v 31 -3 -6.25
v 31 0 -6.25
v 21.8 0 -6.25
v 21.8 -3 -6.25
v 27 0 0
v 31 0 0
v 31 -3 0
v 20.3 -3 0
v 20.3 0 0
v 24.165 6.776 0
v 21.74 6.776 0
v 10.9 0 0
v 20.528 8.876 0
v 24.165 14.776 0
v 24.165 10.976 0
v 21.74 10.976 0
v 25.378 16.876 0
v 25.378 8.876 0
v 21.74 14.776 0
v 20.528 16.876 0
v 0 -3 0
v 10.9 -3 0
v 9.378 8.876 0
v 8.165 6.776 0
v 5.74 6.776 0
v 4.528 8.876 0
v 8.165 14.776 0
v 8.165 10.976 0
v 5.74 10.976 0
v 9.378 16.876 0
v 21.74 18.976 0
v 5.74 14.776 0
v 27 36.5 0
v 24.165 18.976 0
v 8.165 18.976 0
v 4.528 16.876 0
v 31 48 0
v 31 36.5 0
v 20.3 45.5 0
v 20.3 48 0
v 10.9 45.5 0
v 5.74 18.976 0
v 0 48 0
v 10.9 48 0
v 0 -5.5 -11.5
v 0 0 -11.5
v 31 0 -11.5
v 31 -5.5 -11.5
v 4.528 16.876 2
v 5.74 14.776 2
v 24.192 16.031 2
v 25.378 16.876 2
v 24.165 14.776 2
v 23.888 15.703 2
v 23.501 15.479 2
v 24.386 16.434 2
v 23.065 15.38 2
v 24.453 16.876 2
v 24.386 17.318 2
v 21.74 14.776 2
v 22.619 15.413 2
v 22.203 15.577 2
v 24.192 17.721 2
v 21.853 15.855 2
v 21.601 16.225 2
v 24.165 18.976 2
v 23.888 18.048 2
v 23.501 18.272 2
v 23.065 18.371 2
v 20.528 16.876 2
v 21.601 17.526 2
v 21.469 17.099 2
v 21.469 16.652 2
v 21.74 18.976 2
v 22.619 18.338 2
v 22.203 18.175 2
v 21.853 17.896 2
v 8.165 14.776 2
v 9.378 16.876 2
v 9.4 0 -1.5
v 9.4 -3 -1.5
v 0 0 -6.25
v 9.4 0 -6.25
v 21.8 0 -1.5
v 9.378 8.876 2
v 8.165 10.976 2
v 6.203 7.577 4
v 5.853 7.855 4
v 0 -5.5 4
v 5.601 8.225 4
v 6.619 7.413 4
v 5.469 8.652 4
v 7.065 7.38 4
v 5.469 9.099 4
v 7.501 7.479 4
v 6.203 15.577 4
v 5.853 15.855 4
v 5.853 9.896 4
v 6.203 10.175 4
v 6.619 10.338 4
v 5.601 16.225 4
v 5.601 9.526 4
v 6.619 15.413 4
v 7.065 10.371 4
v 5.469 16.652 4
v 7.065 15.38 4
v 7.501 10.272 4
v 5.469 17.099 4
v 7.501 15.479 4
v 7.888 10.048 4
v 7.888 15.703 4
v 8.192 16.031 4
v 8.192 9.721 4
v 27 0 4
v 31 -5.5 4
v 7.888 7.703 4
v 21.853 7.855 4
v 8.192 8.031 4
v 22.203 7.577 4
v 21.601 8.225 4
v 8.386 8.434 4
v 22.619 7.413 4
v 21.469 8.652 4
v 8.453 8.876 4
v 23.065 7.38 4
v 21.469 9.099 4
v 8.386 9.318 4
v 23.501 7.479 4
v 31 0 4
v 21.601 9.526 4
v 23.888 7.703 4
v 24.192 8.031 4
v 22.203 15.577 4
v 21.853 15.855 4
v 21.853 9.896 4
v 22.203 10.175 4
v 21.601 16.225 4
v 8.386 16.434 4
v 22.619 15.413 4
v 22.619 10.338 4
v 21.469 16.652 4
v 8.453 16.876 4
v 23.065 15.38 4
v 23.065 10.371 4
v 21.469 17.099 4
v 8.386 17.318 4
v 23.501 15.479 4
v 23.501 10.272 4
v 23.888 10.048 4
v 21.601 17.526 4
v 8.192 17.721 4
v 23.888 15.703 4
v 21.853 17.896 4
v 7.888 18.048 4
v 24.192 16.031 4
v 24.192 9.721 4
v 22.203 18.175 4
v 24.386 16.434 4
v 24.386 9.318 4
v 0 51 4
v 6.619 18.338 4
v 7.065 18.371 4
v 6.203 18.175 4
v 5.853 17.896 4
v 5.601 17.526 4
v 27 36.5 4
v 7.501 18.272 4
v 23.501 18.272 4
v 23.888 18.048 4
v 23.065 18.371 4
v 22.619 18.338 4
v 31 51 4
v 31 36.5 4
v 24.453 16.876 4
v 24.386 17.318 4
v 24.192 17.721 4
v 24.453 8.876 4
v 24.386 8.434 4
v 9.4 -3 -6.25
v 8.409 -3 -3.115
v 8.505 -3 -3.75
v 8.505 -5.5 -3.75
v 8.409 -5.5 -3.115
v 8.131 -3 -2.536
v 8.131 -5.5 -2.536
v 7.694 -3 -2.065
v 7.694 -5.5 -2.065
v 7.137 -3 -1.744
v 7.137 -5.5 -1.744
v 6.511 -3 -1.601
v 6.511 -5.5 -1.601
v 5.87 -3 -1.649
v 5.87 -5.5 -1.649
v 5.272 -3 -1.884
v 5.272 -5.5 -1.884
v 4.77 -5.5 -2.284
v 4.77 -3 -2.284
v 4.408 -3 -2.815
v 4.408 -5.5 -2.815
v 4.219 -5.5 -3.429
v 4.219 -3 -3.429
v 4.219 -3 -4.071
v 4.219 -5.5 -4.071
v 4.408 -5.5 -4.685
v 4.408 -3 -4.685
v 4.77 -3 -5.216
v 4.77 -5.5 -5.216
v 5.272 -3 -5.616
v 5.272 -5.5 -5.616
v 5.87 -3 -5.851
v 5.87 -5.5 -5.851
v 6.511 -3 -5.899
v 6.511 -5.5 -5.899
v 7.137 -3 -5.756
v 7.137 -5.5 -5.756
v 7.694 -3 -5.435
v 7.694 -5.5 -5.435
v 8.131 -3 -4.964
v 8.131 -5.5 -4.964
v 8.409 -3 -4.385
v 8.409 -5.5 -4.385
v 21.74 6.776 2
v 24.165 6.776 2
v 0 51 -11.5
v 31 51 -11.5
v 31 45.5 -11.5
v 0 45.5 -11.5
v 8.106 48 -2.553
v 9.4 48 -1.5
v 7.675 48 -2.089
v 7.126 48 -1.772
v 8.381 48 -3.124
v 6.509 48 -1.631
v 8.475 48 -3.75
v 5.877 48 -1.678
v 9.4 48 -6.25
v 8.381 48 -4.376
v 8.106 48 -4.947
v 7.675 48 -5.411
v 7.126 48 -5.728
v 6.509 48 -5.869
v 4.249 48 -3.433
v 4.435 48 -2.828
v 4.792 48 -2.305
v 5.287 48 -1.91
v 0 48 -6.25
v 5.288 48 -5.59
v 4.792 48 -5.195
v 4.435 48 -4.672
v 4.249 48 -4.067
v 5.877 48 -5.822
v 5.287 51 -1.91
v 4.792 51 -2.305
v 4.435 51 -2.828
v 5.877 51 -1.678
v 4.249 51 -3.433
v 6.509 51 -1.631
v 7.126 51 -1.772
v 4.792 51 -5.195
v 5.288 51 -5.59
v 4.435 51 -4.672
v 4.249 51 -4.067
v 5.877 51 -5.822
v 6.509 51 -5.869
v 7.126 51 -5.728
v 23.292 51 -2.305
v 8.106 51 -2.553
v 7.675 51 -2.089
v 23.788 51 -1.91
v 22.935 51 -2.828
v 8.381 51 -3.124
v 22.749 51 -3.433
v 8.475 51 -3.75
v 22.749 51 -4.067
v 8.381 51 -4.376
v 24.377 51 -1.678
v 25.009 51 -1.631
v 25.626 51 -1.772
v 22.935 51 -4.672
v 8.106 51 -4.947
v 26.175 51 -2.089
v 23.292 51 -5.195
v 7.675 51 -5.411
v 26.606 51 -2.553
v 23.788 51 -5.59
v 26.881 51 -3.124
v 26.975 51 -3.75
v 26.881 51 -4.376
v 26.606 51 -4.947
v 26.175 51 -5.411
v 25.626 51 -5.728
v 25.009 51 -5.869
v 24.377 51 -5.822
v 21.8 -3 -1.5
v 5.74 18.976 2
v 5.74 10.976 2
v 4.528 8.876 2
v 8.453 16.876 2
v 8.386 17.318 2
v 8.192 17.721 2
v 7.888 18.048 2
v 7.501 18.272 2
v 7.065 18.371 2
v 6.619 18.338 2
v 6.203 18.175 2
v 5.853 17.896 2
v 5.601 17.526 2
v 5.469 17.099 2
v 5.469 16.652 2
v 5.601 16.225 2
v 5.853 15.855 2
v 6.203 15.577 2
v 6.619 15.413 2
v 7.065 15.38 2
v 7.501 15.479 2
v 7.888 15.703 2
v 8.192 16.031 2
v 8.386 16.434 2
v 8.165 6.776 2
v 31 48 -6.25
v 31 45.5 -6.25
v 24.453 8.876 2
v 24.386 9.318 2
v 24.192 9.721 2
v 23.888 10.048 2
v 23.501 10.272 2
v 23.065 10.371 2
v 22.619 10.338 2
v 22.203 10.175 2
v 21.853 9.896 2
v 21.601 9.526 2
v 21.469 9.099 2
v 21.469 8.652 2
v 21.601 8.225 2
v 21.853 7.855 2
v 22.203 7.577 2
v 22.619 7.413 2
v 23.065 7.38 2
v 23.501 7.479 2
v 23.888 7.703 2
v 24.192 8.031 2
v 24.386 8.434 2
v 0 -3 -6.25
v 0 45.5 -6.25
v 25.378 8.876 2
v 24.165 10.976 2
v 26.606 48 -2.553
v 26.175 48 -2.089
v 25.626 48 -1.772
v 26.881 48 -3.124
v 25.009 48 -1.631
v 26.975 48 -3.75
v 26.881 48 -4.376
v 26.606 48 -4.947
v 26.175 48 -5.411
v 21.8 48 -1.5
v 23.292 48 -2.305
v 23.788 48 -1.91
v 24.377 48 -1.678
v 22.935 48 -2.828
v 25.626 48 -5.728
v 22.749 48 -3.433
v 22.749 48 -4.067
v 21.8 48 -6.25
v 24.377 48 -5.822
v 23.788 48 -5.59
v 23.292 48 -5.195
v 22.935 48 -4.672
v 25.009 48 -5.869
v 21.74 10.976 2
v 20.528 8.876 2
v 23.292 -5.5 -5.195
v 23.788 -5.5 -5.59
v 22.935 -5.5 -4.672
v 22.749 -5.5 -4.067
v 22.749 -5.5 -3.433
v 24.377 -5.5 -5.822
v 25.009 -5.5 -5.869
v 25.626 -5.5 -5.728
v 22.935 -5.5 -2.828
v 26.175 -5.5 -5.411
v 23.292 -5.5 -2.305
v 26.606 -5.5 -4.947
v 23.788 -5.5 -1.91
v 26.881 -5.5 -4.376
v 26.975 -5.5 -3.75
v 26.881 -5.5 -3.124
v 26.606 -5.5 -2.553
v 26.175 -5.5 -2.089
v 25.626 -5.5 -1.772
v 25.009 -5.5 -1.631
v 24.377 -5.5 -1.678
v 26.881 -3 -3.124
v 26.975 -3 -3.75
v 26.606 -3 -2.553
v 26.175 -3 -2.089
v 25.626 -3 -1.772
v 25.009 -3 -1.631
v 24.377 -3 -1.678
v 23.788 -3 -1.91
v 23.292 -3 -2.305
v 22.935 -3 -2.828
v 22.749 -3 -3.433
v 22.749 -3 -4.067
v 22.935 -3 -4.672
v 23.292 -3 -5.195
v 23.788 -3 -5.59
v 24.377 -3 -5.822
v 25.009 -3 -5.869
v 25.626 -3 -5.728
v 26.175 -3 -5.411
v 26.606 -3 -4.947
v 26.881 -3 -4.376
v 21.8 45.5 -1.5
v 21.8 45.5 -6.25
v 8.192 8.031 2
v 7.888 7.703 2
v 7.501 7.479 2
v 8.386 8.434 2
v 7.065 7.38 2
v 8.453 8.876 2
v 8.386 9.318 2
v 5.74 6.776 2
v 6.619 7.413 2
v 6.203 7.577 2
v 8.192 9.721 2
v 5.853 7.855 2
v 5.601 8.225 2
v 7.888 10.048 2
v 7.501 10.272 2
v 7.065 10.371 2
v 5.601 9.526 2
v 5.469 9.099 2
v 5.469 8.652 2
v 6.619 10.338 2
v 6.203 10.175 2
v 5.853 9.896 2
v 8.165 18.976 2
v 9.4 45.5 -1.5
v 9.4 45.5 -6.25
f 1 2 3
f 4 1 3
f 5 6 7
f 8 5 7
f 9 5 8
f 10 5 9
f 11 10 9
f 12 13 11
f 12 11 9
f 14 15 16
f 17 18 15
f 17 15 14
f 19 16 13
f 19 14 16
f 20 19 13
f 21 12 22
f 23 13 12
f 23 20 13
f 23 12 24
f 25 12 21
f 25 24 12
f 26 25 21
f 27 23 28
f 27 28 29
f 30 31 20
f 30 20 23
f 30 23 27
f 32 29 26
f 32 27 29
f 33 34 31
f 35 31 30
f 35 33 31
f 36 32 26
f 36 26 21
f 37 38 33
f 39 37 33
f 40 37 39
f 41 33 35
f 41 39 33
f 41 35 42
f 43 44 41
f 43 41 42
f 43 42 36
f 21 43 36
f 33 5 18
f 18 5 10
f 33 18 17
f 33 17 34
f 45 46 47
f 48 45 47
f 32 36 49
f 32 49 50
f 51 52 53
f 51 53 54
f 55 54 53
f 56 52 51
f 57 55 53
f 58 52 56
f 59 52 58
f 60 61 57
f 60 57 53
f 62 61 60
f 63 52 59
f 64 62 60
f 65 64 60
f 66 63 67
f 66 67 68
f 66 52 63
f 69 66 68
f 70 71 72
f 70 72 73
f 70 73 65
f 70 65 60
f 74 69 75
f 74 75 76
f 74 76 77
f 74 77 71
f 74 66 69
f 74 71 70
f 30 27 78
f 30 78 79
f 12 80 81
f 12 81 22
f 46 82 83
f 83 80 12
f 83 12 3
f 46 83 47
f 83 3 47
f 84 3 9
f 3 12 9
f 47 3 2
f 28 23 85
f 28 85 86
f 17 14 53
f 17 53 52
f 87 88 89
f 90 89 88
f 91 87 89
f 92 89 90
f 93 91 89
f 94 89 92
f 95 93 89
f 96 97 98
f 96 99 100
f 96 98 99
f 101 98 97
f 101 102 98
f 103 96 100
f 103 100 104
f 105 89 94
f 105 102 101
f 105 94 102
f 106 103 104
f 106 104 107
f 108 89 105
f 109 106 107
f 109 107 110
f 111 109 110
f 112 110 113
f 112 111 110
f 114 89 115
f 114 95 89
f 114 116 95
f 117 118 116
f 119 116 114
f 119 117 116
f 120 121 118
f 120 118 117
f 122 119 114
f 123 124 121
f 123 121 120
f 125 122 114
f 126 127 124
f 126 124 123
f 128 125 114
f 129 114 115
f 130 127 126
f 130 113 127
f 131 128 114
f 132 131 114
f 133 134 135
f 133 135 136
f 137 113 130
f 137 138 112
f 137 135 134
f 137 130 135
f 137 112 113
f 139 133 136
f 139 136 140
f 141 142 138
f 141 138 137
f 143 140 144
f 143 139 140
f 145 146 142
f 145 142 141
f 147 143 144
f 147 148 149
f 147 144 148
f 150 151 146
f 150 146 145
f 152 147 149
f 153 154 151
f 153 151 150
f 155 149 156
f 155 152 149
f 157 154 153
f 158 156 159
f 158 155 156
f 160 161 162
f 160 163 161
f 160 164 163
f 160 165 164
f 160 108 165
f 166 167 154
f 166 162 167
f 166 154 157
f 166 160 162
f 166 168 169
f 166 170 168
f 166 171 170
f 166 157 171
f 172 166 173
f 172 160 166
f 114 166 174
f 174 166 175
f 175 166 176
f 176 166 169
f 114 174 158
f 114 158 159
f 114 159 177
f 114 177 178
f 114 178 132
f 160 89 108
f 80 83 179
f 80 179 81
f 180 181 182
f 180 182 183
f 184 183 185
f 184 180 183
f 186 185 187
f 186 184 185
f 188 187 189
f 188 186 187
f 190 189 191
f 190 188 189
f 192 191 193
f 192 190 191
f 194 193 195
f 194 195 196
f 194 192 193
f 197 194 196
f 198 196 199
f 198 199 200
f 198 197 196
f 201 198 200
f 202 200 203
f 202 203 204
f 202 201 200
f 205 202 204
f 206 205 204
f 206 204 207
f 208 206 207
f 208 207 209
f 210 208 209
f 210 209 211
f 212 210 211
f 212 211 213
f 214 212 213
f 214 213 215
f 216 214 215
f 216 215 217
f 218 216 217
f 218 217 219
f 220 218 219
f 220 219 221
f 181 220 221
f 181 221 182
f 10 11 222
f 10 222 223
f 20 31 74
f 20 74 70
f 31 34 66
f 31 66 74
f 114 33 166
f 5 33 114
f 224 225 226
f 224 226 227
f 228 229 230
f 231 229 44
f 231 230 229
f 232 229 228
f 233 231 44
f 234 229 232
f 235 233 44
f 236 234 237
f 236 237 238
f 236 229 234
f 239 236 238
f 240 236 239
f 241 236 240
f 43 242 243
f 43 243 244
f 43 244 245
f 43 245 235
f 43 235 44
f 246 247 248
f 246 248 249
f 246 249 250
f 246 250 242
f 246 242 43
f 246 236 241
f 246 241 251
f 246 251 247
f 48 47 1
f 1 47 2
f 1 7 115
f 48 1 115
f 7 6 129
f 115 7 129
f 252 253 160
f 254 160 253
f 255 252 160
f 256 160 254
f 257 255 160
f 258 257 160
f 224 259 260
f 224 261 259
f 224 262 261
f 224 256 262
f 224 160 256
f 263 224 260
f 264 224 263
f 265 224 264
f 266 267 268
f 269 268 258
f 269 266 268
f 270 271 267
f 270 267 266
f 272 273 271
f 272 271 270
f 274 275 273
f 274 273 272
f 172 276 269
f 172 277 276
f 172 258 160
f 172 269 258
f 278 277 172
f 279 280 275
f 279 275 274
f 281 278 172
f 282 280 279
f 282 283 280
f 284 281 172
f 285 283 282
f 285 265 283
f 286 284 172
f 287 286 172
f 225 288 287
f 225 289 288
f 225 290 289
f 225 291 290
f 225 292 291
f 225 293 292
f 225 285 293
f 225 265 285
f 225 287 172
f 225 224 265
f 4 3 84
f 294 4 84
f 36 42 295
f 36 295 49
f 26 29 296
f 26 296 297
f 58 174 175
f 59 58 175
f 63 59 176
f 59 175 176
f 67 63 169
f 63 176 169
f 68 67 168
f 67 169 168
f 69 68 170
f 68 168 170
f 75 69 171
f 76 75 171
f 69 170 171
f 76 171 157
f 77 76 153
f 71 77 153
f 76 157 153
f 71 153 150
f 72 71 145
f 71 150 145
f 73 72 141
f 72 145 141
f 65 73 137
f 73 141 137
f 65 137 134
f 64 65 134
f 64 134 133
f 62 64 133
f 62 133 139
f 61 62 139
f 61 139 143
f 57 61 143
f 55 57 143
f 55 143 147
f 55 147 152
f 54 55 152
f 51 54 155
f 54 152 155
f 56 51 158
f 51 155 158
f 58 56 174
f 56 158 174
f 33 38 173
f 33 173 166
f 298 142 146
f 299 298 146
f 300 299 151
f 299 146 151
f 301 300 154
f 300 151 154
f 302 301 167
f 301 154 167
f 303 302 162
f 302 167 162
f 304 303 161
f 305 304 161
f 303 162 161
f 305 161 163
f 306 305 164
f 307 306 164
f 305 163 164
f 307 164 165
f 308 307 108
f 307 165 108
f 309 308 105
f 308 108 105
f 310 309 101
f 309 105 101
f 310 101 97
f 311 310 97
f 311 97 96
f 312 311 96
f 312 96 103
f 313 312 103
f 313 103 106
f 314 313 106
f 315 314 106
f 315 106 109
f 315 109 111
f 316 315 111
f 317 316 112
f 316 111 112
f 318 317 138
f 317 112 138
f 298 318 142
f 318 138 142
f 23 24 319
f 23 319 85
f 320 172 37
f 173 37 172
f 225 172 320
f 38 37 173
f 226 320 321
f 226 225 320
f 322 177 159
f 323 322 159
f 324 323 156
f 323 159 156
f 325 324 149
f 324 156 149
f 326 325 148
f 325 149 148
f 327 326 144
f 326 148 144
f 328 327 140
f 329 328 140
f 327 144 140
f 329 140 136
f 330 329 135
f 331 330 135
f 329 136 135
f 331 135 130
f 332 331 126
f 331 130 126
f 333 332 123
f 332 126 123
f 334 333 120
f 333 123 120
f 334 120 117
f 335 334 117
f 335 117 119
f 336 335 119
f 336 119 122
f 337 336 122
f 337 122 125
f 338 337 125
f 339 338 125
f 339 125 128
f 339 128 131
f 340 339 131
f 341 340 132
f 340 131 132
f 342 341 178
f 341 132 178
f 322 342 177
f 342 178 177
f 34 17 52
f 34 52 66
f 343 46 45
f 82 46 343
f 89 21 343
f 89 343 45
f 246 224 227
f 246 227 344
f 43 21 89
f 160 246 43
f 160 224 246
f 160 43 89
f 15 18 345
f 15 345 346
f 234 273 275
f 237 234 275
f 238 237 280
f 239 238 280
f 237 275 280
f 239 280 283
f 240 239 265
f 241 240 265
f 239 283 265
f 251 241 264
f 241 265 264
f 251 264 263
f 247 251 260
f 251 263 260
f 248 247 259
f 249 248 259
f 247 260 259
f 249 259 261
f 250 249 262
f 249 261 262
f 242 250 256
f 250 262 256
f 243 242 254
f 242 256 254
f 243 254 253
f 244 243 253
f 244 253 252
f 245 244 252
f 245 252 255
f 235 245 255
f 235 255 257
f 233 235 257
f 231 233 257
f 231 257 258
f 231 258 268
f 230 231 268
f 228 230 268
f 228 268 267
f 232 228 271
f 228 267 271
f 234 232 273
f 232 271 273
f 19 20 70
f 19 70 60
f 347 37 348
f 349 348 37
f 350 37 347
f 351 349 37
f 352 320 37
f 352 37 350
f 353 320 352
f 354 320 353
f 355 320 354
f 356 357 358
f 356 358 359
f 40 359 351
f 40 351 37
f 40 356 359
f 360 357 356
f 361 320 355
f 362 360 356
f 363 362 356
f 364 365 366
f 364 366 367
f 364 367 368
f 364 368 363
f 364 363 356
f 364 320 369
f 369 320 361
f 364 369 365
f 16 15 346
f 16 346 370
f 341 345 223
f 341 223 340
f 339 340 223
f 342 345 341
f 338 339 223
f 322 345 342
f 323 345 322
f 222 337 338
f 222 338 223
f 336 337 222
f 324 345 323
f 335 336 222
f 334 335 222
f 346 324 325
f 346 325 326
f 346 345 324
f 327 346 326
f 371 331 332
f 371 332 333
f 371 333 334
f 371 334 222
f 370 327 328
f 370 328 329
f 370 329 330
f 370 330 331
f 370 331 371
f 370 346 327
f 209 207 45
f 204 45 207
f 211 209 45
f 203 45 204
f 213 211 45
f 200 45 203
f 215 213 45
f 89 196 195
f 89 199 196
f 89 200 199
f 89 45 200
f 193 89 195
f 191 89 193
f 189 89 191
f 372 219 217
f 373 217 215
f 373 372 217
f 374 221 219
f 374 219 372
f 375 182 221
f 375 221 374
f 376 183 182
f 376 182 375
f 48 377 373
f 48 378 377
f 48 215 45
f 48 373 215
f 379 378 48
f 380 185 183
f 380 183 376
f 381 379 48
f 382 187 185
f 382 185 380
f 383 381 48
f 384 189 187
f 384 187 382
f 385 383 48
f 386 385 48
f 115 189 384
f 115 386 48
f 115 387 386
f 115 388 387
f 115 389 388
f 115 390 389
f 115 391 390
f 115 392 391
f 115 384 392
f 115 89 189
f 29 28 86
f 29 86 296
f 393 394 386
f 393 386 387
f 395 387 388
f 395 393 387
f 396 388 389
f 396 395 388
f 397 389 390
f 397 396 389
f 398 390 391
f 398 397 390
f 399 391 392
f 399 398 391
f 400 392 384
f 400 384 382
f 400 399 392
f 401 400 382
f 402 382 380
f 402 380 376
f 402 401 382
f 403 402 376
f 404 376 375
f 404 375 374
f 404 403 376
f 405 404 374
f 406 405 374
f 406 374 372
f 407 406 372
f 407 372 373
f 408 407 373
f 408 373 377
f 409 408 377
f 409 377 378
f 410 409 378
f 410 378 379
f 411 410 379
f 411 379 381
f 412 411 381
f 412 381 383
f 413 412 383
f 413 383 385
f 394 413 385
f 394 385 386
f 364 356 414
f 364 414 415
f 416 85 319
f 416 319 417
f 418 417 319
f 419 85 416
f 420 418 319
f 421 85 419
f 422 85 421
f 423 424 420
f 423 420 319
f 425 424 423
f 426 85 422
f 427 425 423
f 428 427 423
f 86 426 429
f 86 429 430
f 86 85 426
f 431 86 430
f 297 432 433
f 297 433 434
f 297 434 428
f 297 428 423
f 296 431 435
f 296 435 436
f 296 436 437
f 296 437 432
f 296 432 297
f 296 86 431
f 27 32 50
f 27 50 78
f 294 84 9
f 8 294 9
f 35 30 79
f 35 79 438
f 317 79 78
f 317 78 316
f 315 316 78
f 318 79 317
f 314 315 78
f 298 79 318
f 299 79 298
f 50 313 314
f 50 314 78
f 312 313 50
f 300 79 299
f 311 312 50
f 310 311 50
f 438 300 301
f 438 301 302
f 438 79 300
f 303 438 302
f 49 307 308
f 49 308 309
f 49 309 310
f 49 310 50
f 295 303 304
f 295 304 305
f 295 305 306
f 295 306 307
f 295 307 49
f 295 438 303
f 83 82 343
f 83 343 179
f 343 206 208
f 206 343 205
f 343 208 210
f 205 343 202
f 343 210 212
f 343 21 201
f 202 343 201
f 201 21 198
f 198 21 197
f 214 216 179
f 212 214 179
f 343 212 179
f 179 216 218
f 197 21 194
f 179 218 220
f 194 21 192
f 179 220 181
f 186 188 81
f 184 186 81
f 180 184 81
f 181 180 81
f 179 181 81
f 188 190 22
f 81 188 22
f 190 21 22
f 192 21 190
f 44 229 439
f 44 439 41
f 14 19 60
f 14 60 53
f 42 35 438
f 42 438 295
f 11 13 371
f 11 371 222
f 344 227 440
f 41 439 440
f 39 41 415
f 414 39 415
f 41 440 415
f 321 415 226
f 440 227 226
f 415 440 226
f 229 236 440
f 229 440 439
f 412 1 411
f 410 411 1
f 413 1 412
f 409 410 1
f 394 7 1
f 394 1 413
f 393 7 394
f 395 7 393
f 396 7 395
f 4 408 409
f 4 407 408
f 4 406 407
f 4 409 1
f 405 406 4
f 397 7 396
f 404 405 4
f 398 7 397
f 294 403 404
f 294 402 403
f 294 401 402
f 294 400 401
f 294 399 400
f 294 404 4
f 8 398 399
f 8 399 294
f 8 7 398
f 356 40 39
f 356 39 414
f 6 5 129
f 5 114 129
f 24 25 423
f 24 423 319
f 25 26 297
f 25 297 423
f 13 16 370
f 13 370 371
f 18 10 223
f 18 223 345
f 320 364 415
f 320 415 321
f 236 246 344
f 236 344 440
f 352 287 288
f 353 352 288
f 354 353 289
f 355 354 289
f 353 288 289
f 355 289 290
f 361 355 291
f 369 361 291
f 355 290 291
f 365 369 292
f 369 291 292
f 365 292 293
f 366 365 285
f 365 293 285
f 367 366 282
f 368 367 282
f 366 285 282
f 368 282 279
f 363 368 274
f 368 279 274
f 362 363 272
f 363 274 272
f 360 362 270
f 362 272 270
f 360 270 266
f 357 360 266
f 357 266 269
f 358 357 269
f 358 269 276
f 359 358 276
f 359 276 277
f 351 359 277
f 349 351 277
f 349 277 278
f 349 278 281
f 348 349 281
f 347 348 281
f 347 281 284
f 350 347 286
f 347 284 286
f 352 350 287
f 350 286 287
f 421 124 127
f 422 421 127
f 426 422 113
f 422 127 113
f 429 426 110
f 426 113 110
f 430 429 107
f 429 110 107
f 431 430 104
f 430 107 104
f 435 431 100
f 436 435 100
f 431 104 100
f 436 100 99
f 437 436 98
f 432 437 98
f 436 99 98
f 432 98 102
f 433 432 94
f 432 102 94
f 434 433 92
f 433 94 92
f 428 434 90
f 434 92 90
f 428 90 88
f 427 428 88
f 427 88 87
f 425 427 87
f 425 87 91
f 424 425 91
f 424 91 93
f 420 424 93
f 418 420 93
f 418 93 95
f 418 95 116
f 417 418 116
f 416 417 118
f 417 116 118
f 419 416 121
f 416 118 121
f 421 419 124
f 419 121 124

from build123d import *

# Parameters (mm, degrees)
BOSS_EXTRUDE1_DEPTH = 4
SKETCH2_R           = 1.5
BOSS_EXTRUDE2_DEPTH = 2
BOSS_EXTRUDE3_DEPTH = 5.5
SKETCH4_R           = 2.125
BOSS_EXTRUDE4_DEPTH = 3
SKETCH6_W           = 31
SKETCH6_H           = 15.5
SKETCH6_R           = 2.155122413
SKETCH6_R_2         = 2.125
BOSS_EXTRUDE5_DEPTH = 5.5
CUT_EXTRUDE4_DEPTH  = 3


with BuildPart() as part:
    # Sketch1 → Boss-Extrude1 (new body)
    with BuildSketch(Plane.XY):
        Polygon((0, 51), (31, 51), (31, 36.5), (27, 36.5), (27, 0), (0, 0), align=None)
        Polygon((24.165093822, 18.975641236), (21.740222692, 18.975641236), (20.527787127, 16.875641236), (21.740222692, 14.775641236), (24.165093822, 14.775641236), (25.377529388, 16.875641236), align=None, mode=Mode.SUBTRACT)
        Polygon((24.165093822, 10.975641236), (21.740222692, 10.975641236), (20.527787127, 8.875641236), (21.740222692, 6.775641236), (24.165093822, 6.775641236), (25.377529388, 8.875641236), align=None, mode=Mode.SUBTRACT)
        Polygon((8.165093822, 18.975641236), (5.740222692, 18.975641236), (4.527787127, 16.875641236), (5.740222692, 14.775641236), (8.165093822, 14.775641236), (9.377529388, 16.875641236), align=None, mode=Mode.SUBTRACT)
        Polygon((8.165093822, 10.975641236), (5.740222692, 10.975641236), (4.527787127, 8.875641236), (5.740222692, 6.775641236), (8.165093822, 6.775641236), (9.377529388, 8.875641236), align=None, mode=Mode.SUBTRACT)
    extrude(amount=BOSS_EXTRUDE1_DEPTH)

    # Sketch2 → Boss-Extrude2 (add)
    with BuildSketch(Plane.XY.offset(4)):
        Polygon((0, 51), (31, 51), (31, 36.5), (27, 36.5), (27, -2), (0, -2), align=None)
        with Locations((22.952658257, 16.875641236)):
            Circle(SKETCH2_R, mode=Mode.SUBTRACT)
        with Locations((22.952658257, 8.875641236)):
            Circle(SKETCH2_R, mode=Mode.SUBTRACT)
        with Locations((6.952658257, 8.875641236)):
            Circle(SKETCH2_R, mode=Mode.SUBTRACT)
        with Locations((6.952658257, 16.875641236)):
            Circle(SKETCH2_R, mode=Mode.SUBTRACT)
    extrude(amount=-BOSS_EXTRUDE2_DEPTH)

    # Sketch3 → Boss-Extrude3 (add)
    with BuildSketch(Plane(origin=(0, 51, 0), x_dir=(1, 0, 0), z_dir=(0, 1, 0))):
        Polygon((10.9, 0), (20.3, 0), (21.8, 1.5), (21.8, 6.25), (31, 6.25), (31, 11.5), (0, 11.5), (0, 11.25), (0, 6.25), (1.8, 6.25), (9.4, 6.25), (9.4, 1.5), align=None)
    extrude(amount=-BOSS_EXTRUDE3_DEPTH)

    # Sketch4 → Boss-Extrude4 (add)
    with BuildSketch(Plane(origin=(0, 51, 0), x_dir=(1, 0, 0), z_dir=(0, 1, 0))):
        Polygon((31, -4), (0, -4), (0, 11.5), (31, 11.5), (31, 0), align=None)
        with Locations((6.35, 3.75)):
            Circle(SKETCH4_R, mode=Mode.SUBTRACT)
        with Locations((24.85, 3.75)):
            Circle(SKETCH4_R, mode=Mode.SUBTRACT)
    extrude(amount=-BOSS_EXTRUDE4_DEPTH)

    # Sketch6 → Boss-Extrude5 (add)
    with BuildSketch(Plane.XZ):
        with Locations((15.5, -3.75)):
            Rectangle(SKETCH6_W, SKETCH6_H)
        with Locations((6.35, -3.75)):
            Circle(SKETCH6_R, mode=Mode.SUBTRACT)
        with Locations((24.85, -3.75)):
            Circle(SKETCH6_R_2, mode=Mode.SUBTRACT)
    extrude(amount=BOSS_EXTRUDE5_DEPTH)

    # Sketch7 → Cut-Extrude4 (cut)
    with BuildSketch(Plane.XZ):
        Polygon((10.9, 0), (0, 0), (0, -6.25), (9.4, -6.25), (9.4, -1.5), align=None)
        Polygon((20.3, 0), (31, 0), (31, -6.25), (21.8, -6.25), (21.8, -1.5), align=None)
    extrude(amount=CUT_EXTRUDE4_DEPTH, mode=Mode.SUBTRACT)


solid = part.part
